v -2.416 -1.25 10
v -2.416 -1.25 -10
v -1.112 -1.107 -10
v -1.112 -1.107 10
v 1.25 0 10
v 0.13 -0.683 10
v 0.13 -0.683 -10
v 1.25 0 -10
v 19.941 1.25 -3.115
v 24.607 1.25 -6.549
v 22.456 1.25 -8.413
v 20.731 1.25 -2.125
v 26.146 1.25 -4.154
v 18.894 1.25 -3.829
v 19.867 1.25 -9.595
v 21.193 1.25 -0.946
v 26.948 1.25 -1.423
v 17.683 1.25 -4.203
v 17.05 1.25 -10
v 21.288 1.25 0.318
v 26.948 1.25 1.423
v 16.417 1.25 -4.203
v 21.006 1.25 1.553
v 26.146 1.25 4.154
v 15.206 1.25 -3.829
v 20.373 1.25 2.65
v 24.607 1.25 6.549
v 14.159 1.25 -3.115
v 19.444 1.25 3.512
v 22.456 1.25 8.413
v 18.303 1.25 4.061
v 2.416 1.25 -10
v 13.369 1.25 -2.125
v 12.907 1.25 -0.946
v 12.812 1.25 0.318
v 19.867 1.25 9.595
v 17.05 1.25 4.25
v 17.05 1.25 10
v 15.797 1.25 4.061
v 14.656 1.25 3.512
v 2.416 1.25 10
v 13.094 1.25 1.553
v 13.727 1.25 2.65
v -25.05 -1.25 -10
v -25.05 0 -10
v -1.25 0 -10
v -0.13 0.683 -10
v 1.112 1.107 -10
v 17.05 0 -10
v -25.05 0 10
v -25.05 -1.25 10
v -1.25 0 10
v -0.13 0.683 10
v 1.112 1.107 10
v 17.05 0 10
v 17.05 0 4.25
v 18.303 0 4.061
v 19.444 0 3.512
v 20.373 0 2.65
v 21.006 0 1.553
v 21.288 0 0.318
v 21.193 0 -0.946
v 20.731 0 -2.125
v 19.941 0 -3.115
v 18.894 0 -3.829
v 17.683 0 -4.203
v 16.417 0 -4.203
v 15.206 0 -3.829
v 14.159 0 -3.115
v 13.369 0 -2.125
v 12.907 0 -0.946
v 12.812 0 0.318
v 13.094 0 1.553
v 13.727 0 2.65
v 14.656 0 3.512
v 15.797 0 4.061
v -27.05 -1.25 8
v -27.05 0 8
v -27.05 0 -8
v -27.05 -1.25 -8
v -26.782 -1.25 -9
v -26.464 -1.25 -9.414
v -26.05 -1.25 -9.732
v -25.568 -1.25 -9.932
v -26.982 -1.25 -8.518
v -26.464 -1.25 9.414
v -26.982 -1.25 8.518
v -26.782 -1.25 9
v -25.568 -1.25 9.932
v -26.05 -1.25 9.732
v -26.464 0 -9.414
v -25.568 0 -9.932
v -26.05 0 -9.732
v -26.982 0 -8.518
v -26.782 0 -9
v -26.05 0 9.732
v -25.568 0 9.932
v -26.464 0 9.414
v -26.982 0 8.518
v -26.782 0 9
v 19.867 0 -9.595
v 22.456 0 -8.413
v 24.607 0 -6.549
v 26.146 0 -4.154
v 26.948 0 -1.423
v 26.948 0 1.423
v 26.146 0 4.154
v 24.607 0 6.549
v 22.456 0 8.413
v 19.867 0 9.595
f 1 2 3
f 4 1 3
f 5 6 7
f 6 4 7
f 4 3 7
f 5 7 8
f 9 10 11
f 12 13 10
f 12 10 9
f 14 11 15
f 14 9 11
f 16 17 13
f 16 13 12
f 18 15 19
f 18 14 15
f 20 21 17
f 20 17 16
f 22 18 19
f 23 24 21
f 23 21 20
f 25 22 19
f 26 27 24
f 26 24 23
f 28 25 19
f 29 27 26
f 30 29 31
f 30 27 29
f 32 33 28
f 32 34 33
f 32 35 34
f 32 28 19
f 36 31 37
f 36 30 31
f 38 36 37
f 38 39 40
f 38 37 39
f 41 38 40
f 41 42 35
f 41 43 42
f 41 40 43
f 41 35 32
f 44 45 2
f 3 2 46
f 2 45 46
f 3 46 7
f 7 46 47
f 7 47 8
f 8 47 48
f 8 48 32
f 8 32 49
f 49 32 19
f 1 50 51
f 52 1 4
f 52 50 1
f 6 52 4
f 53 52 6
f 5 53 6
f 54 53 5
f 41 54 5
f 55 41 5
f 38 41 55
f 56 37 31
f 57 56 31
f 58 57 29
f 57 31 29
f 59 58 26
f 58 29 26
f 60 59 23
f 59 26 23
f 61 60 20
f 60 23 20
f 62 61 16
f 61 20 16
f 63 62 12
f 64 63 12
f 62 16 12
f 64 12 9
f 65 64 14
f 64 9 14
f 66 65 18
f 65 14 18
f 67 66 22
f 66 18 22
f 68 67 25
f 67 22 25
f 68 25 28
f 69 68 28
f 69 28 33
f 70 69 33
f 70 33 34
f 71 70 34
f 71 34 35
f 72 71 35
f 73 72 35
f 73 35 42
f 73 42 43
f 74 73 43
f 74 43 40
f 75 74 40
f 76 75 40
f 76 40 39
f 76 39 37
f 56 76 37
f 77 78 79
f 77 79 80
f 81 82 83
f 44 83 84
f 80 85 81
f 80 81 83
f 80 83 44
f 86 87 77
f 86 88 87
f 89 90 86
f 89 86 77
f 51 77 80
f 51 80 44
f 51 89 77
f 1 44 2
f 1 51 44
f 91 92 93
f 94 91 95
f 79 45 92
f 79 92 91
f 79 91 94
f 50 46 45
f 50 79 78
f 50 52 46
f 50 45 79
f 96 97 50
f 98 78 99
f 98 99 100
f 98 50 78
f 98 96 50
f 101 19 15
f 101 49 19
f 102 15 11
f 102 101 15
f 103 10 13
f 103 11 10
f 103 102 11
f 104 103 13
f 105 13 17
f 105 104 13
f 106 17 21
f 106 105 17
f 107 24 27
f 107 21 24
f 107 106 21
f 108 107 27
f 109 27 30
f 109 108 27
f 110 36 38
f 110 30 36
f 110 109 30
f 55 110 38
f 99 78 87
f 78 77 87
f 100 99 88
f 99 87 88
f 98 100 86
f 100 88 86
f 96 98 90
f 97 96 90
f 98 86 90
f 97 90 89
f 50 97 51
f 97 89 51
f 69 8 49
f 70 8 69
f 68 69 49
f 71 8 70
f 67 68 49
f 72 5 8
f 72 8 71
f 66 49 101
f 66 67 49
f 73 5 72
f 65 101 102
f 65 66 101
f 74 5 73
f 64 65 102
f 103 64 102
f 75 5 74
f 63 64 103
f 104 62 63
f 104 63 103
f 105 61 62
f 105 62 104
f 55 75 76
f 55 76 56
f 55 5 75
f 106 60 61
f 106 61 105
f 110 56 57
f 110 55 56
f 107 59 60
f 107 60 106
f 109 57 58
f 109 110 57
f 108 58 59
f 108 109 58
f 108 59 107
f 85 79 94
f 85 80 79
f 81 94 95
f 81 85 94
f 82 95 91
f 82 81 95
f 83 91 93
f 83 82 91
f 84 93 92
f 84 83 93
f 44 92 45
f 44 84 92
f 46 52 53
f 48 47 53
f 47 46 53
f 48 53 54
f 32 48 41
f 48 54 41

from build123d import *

# Parameters (mm, degrees)
BOSS_EXTRUDE1_DEPTH = 10
FILLET1_R           = 2
FILLET2_RADIUS      = 10
FILLET2_LENGTH      = 1.25
FILLET3_R           = 6
SKETCH2_R           = 4.25
CUT_EXTRUDE1_DEPTH  = 29.94740921


with BuildPart() as part:
    # Sketch1 → Boss-Extrude1 (new, symmetric)
    with BuildSketch(Plane.XY):
        Polygon((0, 1.25), (-1.25, 0), (-27.05, 0), (-27.05, -1.25), (0, -1.25), (1.25, 0), (27.05, 0), (27.05, 1.25), align=None)
    extrude(amount=BOSS_EXTRUDE1_DEPTH, both=True)

    # Fillet1
    fillet1_edges = [part.edges().sort_by_distance(p)[0] for p in [
        (-27.05, -0.625, -10),
        (-27.05, -0.625, 10),
    ]]
    fillet(fillet1_edges, radius=FILLET1_R)

    # Fillet2: full round fillet: the end face becomes a half cylinder, R = half its width
    fillet2_face = Plane((27.05, 0.625, 0), x_dir=(0, -1, 0), z_dir=(1, 0, 0))  # on the end face: x along it, z out of the body
    fillet2_slab = fillet2_face.offset(-FILLET2_RADIUS / 2) * Box(FILLET2_LENGTH, 2 * FILLET2_RADIUS, FILLET2_RADIUS, mode=Mode.PRIVATE)  # the body's end, R deep
    fillet2_round = Plane((17.05, 0.625, 0), x_dir=(1, 0, 0), z_dir=(0, -1, 0)) * Cylinder(FILLET2_RADIUS, FILLET2_LENGTH, mode=Mode.PRIVATE)  # its axis R under the face
    add(fillet2_slab - fillet2_round, mode=Mode.SUBTRACT)

    # Fillet3
    # the kernel refuses this fillet: 6 mm, written as the material it takes off along each edge
    with BuildSketch(Plane(origin=(0, -1.25, -16.039298937), x_dir=(-1, 0, 0), z_dir=(0, 0, 1))) as fillet3_piece_1:
        with BuildLine():
            CenterArc((2.415719575, -6), FILLET3_R, 90, 37.658462006)
            Line((-1.25, -1.25), (-1.323314391, -1.155))
            ThreePointArc((-1.323314391, -1.155), (-0.709852814, -0.540147186), (-0.084852814, 0.084852814))
            Line((-0.084852814, 0.084852814), (0, 0.12))
            Line((0, 0.12), (2.415719575, 0.12))
            Line((2.415719575, 0.12), (2.415719575, 0))
        make_face()
    extrude(amount=32.078597873, mode=Mode.SUBTRACT)
    with BuildSketch(Plane(origin=(0, 1.25, 16.039298937), x_dir=(1, 0, 0), z_dir=(0, 0, -1))) as fillet3_piece_2:
        with BuildLine():
            CenterArc((2.415719575, 6), FILLET3_R, 232.341537994, 37.658462006)
            Line((-1.25, 1.25), (-1.323314391, 1.155))
            ThreePointArc((-1.323314391, 1.155), (-0.709852814, 0.540147186), (-0.084852814, -0.084852814))
            Line((-0.084852814, -0.084852814), (0, -0.12))
            Line((0, -0.12), (2.415719575, -0.12))
            Line((2.415719575, -0.12), (2.415719575, 0))
        make_face()
    extrude(amount=32.078597873, mode=Mode.SUBTRACT)

    # Sketch2 → Cut-Extrude1 (cut, through all)
    with BuildSketch(Plane(origin=(0, 1.25, 0), x_dir=(1, 0, 0), z_dir=(0, 1, 0))):
        with Locations(Location((17.05, 0, 0), (0, 0, 270))):
            Circle(SKETCH2_R)
    extrude(amount=-CUT_EXTRUDE1_DEPTH, mode=Mode.SUBTRACT)


solid = part.part
